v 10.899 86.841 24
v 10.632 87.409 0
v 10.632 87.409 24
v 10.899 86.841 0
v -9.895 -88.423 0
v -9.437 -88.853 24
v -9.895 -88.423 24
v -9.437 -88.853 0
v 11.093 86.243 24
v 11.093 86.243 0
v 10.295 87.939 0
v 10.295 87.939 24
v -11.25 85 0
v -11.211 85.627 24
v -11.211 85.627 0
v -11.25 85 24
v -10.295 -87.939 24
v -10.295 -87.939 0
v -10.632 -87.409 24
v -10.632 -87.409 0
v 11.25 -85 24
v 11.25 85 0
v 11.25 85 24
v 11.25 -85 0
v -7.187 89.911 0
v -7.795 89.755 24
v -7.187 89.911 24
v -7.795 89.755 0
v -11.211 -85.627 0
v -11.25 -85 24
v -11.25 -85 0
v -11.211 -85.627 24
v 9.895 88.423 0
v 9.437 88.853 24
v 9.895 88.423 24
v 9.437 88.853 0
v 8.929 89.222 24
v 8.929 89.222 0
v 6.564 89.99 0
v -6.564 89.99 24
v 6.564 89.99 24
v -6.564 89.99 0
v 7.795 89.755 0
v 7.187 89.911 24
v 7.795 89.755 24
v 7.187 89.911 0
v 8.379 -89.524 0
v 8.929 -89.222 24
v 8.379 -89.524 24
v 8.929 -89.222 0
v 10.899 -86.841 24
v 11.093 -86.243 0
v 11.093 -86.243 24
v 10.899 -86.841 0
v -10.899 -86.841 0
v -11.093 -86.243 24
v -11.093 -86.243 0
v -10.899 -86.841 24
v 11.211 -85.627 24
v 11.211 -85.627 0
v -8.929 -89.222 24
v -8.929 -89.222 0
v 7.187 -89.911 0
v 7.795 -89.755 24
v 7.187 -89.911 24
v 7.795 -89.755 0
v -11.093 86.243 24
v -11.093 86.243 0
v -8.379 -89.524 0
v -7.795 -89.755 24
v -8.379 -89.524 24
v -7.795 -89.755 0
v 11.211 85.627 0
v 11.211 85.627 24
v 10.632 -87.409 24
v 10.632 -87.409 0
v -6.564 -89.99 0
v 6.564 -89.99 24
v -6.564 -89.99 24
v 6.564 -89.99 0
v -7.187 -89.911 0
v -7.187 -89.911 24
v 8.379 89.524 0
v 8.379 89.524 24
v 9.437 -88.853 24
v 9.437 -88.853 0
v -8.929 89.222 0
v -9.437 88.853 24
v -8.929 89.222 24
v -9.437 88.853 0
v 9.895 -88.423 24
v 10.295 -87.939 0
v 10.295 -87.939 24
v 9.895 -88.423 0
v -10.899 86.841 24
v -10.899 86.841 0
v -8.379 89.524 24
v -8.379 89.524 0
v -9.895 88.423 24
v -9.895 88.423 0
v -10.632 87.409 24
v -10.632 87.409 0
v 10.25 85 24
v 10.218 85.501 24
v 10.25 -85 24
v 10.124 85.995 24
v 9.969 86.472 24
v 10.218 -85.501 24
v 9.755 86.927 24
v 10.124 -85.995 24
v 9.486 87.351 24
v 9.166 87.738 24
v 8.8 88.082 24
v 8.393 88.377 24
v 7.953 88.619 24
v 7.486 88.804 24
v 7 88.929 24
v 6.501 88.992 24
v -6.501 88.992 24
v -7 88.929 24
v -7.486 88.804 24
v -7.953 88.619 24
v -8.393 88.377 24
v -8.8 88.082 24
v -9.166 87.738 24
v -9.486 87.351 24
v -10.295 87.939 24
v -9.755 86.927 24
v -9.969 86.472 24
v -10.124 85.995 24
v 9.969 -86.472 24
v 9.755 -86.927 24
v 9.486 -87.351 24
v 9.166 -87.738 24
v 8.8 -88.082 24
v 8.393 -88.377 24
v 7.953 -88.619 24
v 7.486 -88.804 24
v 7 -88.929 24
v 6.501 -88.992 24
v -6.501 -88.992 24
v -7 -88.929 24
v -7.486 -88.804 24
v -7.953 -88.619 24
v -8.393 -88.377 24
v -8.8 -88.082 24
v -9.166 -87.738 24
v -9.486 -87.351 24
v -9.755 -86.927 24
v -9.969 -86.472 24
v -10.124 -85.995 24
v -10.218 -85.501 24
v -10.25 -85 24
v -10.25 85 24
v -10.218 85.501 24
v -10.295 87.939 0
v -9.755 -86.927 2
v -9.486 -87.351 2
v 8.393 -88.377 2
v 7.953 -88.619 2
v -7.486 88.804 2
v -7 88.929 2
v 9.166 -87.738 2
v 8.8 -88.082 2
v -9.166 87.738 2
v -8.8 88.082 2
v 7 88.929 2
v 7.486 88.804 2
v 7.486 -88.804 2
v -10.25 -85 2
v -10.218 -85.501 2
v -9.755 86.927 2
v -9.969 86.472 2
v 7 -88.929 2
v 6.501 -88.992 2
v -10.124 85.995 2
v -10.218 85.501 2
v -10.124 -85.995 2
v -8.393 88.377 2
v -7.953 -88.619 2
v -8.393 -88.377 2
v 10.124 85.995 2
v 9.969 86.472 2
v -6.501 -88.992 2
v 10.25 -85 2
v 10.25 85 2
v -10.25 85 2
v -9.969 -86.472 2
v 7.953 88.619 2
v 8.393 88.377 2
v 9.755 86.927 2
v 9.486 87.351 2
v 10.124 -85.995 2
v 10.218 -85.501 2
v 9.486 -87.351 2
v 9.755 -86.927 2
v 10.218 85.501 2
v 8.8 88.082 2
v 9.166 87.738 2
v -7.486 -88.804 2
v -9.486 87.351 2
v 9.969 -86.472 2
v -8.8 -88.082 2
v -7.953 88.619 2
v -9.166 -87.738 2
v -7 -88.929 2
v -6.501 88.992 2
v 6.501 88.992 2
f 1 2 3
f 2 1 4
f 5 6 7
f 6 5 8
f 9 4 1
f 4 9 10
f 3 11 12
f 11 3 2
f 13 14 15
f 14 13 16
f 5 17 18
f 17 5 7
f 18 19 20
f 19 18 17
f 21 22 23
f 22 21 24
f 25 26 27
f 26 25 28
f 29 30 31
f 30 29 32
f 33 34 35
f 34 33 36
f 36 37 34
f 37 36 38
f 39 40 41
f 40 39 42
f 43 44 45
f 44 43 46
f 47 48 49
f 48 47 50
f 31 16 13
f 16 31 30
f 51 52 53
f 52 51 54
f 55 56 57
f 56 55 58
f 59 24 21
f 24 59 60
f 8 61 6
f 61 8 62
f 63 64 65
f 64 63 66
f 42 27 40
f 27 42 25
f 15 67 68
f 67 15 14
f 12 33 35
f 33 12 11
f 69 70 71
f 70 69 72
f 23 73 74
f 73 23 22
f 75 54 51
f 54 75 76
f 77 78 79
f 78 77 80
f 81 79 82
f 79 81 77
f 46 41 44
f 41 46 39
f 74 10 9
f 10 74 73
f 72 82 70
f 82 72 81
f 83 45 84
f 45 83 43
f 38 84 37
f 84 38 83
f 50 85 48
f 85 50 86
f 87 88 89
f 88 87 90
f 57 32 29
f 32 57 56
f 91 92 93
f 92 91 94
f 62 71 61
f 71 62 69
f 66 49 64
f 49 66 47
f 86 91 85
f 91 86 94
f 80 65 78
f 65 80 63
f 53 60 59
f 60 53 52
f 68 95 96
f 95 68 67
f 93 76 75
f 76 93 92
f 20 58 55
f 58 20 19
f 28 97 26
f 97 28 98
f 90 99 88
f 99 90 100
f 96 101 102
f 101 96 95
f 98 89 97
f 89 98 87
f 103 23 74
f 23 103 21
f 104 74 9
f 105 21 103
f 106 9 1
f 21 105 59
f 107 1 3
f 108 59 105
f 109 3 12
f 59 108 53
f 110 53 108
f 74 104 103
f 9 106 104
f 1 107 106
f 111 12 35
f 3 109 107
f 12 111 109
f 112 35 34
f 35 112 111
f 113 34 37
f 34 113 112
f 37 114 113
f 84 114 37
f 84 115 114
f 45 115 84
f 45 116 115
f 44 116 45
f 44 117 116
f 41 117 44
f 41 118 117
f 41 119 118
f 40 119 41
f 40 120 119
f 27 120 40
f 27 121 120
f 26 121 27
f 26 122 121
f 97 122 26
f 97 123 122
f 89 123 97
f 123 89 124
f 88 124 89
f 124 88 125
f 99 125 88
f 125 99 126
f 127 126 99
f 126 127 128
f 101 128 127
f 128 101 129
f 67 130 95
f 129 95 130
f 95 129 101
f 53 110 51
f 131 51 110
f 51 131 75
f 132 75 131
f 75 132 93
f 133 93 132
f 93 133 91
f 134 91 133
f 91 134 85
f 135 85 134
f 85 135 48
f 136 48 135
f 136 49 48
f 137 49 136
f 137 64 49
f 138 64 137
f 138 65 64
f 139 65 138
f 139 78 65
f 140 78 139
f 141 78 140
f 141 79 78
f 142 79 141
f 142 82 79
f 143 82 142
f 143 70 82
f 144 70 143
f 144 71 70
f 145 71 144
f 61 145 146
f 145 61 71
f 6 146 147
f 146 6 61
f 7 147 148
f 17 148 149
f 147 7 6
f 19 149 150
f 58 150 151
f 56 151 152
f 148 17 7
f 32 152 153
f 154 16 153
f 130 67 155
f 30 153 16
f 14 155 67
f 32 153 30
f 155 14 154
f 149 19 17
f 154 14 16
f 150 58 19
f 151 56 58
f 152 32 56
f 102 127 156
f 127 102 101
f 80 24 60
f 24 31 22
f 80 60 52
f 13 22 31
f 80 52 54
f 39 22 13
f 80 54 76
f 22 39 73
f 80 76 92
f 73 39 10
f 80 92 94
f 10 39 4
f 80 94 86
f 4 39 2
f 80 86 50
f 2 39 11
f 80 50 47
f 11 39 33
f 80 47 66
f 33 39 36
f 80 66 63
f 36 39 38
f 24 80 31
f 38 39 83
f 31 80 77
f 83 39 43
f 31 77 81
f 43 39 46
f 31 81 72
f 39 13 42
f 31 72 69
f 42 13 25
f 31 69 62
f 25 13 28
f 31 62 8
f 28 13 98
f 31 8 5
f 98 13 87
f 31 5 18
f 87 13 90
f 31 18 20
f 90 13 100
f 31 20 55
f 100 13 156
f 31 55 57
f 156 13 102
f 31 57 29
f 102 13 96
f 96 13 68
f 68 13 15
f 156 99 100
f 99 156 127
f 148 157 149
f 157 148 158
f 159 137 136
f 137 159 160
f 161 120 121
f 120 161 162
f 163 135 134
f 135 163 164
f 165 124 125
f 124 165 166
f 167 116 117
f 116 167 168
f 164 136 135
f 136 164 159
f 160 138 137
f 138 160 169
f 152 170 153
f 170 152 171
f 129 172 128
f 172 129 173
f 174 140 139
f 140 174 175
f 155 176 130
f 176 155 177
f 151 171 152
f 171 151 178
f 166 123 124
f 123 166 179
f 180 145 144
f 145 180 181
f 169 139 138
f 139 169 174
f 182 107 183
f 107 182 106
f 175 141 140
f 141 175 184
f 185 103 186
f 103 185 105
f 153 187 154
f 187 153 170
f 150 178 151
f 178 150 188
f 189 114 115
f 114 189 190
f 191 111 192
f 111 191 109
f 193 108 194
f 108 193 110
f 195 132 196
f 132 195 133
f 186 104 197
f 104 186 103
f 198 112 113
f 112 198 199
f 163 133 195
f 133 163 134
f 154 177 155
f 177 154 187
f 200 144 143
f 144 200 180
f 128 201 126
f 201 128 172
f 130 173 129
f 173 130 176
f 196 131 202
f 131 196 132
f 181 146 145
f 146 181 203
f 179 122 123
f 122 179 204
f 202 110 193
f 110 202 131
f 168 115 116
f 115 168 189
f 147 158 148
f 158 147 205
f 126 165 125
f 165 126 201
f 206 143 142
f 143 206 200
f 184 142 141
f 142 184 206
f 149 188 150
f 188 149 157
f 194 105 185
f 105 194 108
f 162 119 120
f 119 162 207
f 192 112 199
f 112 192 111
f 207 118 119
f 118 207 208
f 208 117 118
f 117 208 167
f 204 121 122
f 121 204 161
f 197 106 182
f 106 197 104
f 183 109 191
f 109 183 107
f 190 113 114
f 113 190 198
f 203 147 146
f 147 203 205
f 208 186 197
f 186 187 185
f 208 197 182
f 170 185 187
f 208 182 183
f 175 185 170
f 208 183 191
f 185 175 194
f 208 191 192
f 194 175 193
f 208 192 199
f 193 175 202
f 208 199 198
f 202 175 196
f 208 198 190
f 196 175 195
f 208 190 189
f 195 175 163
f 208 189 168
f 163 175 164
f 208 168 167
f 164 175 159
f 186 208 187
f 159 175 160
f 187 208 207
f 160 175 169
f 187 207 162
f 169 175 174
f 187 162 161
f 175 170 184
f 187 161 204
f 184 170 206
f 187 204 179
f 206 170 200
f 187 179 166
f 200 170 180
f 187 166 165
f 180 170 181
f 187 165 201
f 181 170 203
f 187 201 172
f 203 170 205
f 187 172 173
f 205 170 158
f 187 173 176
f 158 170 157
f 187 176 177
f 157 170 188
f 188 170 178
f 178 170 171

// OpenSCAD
$fn = 50;


difference() {
	union() {
		hull() {
			translate(v = [-6.2500000000, 85.0000000000, 0]) {
				cylinder(h = 24, r = 5);
			}
			translate(v = [6.2500000000, 85.0000000000, 0]) {
				cylinder(h = 24, r = 5);
			}
			translate(v = [-6.2500000000, -85.0000000000, 0]) {
				cylinder(h = 24, r = 5);
			}
			translate(v = [6.2500000000, -85.0000000000, 0]) {
				cylinder(h = 24, r = 5);
			}
		}
	}
	union() {
		translate(v = [0, 0, 2]) {
			hull() {
				translate(v = [-6.2500000000, 85.0000000000, 0]) {
					cylinder(h = 22, r = 4);
				}
				translate(v = [6.2500000000, 85.0000000000, 0]) {
					cylinder(h = 22, r = 4);
				}
				translate(v = [-6.2500000000, -85.0000000000, 0]) {
					cylinder(h = 22, r = 4);
				}
				translate(v = [6.2500000000, -85.0000000000, 0]) {
					cylinder(h = 22, r = 4);
				}
			}
		}
	}
}
